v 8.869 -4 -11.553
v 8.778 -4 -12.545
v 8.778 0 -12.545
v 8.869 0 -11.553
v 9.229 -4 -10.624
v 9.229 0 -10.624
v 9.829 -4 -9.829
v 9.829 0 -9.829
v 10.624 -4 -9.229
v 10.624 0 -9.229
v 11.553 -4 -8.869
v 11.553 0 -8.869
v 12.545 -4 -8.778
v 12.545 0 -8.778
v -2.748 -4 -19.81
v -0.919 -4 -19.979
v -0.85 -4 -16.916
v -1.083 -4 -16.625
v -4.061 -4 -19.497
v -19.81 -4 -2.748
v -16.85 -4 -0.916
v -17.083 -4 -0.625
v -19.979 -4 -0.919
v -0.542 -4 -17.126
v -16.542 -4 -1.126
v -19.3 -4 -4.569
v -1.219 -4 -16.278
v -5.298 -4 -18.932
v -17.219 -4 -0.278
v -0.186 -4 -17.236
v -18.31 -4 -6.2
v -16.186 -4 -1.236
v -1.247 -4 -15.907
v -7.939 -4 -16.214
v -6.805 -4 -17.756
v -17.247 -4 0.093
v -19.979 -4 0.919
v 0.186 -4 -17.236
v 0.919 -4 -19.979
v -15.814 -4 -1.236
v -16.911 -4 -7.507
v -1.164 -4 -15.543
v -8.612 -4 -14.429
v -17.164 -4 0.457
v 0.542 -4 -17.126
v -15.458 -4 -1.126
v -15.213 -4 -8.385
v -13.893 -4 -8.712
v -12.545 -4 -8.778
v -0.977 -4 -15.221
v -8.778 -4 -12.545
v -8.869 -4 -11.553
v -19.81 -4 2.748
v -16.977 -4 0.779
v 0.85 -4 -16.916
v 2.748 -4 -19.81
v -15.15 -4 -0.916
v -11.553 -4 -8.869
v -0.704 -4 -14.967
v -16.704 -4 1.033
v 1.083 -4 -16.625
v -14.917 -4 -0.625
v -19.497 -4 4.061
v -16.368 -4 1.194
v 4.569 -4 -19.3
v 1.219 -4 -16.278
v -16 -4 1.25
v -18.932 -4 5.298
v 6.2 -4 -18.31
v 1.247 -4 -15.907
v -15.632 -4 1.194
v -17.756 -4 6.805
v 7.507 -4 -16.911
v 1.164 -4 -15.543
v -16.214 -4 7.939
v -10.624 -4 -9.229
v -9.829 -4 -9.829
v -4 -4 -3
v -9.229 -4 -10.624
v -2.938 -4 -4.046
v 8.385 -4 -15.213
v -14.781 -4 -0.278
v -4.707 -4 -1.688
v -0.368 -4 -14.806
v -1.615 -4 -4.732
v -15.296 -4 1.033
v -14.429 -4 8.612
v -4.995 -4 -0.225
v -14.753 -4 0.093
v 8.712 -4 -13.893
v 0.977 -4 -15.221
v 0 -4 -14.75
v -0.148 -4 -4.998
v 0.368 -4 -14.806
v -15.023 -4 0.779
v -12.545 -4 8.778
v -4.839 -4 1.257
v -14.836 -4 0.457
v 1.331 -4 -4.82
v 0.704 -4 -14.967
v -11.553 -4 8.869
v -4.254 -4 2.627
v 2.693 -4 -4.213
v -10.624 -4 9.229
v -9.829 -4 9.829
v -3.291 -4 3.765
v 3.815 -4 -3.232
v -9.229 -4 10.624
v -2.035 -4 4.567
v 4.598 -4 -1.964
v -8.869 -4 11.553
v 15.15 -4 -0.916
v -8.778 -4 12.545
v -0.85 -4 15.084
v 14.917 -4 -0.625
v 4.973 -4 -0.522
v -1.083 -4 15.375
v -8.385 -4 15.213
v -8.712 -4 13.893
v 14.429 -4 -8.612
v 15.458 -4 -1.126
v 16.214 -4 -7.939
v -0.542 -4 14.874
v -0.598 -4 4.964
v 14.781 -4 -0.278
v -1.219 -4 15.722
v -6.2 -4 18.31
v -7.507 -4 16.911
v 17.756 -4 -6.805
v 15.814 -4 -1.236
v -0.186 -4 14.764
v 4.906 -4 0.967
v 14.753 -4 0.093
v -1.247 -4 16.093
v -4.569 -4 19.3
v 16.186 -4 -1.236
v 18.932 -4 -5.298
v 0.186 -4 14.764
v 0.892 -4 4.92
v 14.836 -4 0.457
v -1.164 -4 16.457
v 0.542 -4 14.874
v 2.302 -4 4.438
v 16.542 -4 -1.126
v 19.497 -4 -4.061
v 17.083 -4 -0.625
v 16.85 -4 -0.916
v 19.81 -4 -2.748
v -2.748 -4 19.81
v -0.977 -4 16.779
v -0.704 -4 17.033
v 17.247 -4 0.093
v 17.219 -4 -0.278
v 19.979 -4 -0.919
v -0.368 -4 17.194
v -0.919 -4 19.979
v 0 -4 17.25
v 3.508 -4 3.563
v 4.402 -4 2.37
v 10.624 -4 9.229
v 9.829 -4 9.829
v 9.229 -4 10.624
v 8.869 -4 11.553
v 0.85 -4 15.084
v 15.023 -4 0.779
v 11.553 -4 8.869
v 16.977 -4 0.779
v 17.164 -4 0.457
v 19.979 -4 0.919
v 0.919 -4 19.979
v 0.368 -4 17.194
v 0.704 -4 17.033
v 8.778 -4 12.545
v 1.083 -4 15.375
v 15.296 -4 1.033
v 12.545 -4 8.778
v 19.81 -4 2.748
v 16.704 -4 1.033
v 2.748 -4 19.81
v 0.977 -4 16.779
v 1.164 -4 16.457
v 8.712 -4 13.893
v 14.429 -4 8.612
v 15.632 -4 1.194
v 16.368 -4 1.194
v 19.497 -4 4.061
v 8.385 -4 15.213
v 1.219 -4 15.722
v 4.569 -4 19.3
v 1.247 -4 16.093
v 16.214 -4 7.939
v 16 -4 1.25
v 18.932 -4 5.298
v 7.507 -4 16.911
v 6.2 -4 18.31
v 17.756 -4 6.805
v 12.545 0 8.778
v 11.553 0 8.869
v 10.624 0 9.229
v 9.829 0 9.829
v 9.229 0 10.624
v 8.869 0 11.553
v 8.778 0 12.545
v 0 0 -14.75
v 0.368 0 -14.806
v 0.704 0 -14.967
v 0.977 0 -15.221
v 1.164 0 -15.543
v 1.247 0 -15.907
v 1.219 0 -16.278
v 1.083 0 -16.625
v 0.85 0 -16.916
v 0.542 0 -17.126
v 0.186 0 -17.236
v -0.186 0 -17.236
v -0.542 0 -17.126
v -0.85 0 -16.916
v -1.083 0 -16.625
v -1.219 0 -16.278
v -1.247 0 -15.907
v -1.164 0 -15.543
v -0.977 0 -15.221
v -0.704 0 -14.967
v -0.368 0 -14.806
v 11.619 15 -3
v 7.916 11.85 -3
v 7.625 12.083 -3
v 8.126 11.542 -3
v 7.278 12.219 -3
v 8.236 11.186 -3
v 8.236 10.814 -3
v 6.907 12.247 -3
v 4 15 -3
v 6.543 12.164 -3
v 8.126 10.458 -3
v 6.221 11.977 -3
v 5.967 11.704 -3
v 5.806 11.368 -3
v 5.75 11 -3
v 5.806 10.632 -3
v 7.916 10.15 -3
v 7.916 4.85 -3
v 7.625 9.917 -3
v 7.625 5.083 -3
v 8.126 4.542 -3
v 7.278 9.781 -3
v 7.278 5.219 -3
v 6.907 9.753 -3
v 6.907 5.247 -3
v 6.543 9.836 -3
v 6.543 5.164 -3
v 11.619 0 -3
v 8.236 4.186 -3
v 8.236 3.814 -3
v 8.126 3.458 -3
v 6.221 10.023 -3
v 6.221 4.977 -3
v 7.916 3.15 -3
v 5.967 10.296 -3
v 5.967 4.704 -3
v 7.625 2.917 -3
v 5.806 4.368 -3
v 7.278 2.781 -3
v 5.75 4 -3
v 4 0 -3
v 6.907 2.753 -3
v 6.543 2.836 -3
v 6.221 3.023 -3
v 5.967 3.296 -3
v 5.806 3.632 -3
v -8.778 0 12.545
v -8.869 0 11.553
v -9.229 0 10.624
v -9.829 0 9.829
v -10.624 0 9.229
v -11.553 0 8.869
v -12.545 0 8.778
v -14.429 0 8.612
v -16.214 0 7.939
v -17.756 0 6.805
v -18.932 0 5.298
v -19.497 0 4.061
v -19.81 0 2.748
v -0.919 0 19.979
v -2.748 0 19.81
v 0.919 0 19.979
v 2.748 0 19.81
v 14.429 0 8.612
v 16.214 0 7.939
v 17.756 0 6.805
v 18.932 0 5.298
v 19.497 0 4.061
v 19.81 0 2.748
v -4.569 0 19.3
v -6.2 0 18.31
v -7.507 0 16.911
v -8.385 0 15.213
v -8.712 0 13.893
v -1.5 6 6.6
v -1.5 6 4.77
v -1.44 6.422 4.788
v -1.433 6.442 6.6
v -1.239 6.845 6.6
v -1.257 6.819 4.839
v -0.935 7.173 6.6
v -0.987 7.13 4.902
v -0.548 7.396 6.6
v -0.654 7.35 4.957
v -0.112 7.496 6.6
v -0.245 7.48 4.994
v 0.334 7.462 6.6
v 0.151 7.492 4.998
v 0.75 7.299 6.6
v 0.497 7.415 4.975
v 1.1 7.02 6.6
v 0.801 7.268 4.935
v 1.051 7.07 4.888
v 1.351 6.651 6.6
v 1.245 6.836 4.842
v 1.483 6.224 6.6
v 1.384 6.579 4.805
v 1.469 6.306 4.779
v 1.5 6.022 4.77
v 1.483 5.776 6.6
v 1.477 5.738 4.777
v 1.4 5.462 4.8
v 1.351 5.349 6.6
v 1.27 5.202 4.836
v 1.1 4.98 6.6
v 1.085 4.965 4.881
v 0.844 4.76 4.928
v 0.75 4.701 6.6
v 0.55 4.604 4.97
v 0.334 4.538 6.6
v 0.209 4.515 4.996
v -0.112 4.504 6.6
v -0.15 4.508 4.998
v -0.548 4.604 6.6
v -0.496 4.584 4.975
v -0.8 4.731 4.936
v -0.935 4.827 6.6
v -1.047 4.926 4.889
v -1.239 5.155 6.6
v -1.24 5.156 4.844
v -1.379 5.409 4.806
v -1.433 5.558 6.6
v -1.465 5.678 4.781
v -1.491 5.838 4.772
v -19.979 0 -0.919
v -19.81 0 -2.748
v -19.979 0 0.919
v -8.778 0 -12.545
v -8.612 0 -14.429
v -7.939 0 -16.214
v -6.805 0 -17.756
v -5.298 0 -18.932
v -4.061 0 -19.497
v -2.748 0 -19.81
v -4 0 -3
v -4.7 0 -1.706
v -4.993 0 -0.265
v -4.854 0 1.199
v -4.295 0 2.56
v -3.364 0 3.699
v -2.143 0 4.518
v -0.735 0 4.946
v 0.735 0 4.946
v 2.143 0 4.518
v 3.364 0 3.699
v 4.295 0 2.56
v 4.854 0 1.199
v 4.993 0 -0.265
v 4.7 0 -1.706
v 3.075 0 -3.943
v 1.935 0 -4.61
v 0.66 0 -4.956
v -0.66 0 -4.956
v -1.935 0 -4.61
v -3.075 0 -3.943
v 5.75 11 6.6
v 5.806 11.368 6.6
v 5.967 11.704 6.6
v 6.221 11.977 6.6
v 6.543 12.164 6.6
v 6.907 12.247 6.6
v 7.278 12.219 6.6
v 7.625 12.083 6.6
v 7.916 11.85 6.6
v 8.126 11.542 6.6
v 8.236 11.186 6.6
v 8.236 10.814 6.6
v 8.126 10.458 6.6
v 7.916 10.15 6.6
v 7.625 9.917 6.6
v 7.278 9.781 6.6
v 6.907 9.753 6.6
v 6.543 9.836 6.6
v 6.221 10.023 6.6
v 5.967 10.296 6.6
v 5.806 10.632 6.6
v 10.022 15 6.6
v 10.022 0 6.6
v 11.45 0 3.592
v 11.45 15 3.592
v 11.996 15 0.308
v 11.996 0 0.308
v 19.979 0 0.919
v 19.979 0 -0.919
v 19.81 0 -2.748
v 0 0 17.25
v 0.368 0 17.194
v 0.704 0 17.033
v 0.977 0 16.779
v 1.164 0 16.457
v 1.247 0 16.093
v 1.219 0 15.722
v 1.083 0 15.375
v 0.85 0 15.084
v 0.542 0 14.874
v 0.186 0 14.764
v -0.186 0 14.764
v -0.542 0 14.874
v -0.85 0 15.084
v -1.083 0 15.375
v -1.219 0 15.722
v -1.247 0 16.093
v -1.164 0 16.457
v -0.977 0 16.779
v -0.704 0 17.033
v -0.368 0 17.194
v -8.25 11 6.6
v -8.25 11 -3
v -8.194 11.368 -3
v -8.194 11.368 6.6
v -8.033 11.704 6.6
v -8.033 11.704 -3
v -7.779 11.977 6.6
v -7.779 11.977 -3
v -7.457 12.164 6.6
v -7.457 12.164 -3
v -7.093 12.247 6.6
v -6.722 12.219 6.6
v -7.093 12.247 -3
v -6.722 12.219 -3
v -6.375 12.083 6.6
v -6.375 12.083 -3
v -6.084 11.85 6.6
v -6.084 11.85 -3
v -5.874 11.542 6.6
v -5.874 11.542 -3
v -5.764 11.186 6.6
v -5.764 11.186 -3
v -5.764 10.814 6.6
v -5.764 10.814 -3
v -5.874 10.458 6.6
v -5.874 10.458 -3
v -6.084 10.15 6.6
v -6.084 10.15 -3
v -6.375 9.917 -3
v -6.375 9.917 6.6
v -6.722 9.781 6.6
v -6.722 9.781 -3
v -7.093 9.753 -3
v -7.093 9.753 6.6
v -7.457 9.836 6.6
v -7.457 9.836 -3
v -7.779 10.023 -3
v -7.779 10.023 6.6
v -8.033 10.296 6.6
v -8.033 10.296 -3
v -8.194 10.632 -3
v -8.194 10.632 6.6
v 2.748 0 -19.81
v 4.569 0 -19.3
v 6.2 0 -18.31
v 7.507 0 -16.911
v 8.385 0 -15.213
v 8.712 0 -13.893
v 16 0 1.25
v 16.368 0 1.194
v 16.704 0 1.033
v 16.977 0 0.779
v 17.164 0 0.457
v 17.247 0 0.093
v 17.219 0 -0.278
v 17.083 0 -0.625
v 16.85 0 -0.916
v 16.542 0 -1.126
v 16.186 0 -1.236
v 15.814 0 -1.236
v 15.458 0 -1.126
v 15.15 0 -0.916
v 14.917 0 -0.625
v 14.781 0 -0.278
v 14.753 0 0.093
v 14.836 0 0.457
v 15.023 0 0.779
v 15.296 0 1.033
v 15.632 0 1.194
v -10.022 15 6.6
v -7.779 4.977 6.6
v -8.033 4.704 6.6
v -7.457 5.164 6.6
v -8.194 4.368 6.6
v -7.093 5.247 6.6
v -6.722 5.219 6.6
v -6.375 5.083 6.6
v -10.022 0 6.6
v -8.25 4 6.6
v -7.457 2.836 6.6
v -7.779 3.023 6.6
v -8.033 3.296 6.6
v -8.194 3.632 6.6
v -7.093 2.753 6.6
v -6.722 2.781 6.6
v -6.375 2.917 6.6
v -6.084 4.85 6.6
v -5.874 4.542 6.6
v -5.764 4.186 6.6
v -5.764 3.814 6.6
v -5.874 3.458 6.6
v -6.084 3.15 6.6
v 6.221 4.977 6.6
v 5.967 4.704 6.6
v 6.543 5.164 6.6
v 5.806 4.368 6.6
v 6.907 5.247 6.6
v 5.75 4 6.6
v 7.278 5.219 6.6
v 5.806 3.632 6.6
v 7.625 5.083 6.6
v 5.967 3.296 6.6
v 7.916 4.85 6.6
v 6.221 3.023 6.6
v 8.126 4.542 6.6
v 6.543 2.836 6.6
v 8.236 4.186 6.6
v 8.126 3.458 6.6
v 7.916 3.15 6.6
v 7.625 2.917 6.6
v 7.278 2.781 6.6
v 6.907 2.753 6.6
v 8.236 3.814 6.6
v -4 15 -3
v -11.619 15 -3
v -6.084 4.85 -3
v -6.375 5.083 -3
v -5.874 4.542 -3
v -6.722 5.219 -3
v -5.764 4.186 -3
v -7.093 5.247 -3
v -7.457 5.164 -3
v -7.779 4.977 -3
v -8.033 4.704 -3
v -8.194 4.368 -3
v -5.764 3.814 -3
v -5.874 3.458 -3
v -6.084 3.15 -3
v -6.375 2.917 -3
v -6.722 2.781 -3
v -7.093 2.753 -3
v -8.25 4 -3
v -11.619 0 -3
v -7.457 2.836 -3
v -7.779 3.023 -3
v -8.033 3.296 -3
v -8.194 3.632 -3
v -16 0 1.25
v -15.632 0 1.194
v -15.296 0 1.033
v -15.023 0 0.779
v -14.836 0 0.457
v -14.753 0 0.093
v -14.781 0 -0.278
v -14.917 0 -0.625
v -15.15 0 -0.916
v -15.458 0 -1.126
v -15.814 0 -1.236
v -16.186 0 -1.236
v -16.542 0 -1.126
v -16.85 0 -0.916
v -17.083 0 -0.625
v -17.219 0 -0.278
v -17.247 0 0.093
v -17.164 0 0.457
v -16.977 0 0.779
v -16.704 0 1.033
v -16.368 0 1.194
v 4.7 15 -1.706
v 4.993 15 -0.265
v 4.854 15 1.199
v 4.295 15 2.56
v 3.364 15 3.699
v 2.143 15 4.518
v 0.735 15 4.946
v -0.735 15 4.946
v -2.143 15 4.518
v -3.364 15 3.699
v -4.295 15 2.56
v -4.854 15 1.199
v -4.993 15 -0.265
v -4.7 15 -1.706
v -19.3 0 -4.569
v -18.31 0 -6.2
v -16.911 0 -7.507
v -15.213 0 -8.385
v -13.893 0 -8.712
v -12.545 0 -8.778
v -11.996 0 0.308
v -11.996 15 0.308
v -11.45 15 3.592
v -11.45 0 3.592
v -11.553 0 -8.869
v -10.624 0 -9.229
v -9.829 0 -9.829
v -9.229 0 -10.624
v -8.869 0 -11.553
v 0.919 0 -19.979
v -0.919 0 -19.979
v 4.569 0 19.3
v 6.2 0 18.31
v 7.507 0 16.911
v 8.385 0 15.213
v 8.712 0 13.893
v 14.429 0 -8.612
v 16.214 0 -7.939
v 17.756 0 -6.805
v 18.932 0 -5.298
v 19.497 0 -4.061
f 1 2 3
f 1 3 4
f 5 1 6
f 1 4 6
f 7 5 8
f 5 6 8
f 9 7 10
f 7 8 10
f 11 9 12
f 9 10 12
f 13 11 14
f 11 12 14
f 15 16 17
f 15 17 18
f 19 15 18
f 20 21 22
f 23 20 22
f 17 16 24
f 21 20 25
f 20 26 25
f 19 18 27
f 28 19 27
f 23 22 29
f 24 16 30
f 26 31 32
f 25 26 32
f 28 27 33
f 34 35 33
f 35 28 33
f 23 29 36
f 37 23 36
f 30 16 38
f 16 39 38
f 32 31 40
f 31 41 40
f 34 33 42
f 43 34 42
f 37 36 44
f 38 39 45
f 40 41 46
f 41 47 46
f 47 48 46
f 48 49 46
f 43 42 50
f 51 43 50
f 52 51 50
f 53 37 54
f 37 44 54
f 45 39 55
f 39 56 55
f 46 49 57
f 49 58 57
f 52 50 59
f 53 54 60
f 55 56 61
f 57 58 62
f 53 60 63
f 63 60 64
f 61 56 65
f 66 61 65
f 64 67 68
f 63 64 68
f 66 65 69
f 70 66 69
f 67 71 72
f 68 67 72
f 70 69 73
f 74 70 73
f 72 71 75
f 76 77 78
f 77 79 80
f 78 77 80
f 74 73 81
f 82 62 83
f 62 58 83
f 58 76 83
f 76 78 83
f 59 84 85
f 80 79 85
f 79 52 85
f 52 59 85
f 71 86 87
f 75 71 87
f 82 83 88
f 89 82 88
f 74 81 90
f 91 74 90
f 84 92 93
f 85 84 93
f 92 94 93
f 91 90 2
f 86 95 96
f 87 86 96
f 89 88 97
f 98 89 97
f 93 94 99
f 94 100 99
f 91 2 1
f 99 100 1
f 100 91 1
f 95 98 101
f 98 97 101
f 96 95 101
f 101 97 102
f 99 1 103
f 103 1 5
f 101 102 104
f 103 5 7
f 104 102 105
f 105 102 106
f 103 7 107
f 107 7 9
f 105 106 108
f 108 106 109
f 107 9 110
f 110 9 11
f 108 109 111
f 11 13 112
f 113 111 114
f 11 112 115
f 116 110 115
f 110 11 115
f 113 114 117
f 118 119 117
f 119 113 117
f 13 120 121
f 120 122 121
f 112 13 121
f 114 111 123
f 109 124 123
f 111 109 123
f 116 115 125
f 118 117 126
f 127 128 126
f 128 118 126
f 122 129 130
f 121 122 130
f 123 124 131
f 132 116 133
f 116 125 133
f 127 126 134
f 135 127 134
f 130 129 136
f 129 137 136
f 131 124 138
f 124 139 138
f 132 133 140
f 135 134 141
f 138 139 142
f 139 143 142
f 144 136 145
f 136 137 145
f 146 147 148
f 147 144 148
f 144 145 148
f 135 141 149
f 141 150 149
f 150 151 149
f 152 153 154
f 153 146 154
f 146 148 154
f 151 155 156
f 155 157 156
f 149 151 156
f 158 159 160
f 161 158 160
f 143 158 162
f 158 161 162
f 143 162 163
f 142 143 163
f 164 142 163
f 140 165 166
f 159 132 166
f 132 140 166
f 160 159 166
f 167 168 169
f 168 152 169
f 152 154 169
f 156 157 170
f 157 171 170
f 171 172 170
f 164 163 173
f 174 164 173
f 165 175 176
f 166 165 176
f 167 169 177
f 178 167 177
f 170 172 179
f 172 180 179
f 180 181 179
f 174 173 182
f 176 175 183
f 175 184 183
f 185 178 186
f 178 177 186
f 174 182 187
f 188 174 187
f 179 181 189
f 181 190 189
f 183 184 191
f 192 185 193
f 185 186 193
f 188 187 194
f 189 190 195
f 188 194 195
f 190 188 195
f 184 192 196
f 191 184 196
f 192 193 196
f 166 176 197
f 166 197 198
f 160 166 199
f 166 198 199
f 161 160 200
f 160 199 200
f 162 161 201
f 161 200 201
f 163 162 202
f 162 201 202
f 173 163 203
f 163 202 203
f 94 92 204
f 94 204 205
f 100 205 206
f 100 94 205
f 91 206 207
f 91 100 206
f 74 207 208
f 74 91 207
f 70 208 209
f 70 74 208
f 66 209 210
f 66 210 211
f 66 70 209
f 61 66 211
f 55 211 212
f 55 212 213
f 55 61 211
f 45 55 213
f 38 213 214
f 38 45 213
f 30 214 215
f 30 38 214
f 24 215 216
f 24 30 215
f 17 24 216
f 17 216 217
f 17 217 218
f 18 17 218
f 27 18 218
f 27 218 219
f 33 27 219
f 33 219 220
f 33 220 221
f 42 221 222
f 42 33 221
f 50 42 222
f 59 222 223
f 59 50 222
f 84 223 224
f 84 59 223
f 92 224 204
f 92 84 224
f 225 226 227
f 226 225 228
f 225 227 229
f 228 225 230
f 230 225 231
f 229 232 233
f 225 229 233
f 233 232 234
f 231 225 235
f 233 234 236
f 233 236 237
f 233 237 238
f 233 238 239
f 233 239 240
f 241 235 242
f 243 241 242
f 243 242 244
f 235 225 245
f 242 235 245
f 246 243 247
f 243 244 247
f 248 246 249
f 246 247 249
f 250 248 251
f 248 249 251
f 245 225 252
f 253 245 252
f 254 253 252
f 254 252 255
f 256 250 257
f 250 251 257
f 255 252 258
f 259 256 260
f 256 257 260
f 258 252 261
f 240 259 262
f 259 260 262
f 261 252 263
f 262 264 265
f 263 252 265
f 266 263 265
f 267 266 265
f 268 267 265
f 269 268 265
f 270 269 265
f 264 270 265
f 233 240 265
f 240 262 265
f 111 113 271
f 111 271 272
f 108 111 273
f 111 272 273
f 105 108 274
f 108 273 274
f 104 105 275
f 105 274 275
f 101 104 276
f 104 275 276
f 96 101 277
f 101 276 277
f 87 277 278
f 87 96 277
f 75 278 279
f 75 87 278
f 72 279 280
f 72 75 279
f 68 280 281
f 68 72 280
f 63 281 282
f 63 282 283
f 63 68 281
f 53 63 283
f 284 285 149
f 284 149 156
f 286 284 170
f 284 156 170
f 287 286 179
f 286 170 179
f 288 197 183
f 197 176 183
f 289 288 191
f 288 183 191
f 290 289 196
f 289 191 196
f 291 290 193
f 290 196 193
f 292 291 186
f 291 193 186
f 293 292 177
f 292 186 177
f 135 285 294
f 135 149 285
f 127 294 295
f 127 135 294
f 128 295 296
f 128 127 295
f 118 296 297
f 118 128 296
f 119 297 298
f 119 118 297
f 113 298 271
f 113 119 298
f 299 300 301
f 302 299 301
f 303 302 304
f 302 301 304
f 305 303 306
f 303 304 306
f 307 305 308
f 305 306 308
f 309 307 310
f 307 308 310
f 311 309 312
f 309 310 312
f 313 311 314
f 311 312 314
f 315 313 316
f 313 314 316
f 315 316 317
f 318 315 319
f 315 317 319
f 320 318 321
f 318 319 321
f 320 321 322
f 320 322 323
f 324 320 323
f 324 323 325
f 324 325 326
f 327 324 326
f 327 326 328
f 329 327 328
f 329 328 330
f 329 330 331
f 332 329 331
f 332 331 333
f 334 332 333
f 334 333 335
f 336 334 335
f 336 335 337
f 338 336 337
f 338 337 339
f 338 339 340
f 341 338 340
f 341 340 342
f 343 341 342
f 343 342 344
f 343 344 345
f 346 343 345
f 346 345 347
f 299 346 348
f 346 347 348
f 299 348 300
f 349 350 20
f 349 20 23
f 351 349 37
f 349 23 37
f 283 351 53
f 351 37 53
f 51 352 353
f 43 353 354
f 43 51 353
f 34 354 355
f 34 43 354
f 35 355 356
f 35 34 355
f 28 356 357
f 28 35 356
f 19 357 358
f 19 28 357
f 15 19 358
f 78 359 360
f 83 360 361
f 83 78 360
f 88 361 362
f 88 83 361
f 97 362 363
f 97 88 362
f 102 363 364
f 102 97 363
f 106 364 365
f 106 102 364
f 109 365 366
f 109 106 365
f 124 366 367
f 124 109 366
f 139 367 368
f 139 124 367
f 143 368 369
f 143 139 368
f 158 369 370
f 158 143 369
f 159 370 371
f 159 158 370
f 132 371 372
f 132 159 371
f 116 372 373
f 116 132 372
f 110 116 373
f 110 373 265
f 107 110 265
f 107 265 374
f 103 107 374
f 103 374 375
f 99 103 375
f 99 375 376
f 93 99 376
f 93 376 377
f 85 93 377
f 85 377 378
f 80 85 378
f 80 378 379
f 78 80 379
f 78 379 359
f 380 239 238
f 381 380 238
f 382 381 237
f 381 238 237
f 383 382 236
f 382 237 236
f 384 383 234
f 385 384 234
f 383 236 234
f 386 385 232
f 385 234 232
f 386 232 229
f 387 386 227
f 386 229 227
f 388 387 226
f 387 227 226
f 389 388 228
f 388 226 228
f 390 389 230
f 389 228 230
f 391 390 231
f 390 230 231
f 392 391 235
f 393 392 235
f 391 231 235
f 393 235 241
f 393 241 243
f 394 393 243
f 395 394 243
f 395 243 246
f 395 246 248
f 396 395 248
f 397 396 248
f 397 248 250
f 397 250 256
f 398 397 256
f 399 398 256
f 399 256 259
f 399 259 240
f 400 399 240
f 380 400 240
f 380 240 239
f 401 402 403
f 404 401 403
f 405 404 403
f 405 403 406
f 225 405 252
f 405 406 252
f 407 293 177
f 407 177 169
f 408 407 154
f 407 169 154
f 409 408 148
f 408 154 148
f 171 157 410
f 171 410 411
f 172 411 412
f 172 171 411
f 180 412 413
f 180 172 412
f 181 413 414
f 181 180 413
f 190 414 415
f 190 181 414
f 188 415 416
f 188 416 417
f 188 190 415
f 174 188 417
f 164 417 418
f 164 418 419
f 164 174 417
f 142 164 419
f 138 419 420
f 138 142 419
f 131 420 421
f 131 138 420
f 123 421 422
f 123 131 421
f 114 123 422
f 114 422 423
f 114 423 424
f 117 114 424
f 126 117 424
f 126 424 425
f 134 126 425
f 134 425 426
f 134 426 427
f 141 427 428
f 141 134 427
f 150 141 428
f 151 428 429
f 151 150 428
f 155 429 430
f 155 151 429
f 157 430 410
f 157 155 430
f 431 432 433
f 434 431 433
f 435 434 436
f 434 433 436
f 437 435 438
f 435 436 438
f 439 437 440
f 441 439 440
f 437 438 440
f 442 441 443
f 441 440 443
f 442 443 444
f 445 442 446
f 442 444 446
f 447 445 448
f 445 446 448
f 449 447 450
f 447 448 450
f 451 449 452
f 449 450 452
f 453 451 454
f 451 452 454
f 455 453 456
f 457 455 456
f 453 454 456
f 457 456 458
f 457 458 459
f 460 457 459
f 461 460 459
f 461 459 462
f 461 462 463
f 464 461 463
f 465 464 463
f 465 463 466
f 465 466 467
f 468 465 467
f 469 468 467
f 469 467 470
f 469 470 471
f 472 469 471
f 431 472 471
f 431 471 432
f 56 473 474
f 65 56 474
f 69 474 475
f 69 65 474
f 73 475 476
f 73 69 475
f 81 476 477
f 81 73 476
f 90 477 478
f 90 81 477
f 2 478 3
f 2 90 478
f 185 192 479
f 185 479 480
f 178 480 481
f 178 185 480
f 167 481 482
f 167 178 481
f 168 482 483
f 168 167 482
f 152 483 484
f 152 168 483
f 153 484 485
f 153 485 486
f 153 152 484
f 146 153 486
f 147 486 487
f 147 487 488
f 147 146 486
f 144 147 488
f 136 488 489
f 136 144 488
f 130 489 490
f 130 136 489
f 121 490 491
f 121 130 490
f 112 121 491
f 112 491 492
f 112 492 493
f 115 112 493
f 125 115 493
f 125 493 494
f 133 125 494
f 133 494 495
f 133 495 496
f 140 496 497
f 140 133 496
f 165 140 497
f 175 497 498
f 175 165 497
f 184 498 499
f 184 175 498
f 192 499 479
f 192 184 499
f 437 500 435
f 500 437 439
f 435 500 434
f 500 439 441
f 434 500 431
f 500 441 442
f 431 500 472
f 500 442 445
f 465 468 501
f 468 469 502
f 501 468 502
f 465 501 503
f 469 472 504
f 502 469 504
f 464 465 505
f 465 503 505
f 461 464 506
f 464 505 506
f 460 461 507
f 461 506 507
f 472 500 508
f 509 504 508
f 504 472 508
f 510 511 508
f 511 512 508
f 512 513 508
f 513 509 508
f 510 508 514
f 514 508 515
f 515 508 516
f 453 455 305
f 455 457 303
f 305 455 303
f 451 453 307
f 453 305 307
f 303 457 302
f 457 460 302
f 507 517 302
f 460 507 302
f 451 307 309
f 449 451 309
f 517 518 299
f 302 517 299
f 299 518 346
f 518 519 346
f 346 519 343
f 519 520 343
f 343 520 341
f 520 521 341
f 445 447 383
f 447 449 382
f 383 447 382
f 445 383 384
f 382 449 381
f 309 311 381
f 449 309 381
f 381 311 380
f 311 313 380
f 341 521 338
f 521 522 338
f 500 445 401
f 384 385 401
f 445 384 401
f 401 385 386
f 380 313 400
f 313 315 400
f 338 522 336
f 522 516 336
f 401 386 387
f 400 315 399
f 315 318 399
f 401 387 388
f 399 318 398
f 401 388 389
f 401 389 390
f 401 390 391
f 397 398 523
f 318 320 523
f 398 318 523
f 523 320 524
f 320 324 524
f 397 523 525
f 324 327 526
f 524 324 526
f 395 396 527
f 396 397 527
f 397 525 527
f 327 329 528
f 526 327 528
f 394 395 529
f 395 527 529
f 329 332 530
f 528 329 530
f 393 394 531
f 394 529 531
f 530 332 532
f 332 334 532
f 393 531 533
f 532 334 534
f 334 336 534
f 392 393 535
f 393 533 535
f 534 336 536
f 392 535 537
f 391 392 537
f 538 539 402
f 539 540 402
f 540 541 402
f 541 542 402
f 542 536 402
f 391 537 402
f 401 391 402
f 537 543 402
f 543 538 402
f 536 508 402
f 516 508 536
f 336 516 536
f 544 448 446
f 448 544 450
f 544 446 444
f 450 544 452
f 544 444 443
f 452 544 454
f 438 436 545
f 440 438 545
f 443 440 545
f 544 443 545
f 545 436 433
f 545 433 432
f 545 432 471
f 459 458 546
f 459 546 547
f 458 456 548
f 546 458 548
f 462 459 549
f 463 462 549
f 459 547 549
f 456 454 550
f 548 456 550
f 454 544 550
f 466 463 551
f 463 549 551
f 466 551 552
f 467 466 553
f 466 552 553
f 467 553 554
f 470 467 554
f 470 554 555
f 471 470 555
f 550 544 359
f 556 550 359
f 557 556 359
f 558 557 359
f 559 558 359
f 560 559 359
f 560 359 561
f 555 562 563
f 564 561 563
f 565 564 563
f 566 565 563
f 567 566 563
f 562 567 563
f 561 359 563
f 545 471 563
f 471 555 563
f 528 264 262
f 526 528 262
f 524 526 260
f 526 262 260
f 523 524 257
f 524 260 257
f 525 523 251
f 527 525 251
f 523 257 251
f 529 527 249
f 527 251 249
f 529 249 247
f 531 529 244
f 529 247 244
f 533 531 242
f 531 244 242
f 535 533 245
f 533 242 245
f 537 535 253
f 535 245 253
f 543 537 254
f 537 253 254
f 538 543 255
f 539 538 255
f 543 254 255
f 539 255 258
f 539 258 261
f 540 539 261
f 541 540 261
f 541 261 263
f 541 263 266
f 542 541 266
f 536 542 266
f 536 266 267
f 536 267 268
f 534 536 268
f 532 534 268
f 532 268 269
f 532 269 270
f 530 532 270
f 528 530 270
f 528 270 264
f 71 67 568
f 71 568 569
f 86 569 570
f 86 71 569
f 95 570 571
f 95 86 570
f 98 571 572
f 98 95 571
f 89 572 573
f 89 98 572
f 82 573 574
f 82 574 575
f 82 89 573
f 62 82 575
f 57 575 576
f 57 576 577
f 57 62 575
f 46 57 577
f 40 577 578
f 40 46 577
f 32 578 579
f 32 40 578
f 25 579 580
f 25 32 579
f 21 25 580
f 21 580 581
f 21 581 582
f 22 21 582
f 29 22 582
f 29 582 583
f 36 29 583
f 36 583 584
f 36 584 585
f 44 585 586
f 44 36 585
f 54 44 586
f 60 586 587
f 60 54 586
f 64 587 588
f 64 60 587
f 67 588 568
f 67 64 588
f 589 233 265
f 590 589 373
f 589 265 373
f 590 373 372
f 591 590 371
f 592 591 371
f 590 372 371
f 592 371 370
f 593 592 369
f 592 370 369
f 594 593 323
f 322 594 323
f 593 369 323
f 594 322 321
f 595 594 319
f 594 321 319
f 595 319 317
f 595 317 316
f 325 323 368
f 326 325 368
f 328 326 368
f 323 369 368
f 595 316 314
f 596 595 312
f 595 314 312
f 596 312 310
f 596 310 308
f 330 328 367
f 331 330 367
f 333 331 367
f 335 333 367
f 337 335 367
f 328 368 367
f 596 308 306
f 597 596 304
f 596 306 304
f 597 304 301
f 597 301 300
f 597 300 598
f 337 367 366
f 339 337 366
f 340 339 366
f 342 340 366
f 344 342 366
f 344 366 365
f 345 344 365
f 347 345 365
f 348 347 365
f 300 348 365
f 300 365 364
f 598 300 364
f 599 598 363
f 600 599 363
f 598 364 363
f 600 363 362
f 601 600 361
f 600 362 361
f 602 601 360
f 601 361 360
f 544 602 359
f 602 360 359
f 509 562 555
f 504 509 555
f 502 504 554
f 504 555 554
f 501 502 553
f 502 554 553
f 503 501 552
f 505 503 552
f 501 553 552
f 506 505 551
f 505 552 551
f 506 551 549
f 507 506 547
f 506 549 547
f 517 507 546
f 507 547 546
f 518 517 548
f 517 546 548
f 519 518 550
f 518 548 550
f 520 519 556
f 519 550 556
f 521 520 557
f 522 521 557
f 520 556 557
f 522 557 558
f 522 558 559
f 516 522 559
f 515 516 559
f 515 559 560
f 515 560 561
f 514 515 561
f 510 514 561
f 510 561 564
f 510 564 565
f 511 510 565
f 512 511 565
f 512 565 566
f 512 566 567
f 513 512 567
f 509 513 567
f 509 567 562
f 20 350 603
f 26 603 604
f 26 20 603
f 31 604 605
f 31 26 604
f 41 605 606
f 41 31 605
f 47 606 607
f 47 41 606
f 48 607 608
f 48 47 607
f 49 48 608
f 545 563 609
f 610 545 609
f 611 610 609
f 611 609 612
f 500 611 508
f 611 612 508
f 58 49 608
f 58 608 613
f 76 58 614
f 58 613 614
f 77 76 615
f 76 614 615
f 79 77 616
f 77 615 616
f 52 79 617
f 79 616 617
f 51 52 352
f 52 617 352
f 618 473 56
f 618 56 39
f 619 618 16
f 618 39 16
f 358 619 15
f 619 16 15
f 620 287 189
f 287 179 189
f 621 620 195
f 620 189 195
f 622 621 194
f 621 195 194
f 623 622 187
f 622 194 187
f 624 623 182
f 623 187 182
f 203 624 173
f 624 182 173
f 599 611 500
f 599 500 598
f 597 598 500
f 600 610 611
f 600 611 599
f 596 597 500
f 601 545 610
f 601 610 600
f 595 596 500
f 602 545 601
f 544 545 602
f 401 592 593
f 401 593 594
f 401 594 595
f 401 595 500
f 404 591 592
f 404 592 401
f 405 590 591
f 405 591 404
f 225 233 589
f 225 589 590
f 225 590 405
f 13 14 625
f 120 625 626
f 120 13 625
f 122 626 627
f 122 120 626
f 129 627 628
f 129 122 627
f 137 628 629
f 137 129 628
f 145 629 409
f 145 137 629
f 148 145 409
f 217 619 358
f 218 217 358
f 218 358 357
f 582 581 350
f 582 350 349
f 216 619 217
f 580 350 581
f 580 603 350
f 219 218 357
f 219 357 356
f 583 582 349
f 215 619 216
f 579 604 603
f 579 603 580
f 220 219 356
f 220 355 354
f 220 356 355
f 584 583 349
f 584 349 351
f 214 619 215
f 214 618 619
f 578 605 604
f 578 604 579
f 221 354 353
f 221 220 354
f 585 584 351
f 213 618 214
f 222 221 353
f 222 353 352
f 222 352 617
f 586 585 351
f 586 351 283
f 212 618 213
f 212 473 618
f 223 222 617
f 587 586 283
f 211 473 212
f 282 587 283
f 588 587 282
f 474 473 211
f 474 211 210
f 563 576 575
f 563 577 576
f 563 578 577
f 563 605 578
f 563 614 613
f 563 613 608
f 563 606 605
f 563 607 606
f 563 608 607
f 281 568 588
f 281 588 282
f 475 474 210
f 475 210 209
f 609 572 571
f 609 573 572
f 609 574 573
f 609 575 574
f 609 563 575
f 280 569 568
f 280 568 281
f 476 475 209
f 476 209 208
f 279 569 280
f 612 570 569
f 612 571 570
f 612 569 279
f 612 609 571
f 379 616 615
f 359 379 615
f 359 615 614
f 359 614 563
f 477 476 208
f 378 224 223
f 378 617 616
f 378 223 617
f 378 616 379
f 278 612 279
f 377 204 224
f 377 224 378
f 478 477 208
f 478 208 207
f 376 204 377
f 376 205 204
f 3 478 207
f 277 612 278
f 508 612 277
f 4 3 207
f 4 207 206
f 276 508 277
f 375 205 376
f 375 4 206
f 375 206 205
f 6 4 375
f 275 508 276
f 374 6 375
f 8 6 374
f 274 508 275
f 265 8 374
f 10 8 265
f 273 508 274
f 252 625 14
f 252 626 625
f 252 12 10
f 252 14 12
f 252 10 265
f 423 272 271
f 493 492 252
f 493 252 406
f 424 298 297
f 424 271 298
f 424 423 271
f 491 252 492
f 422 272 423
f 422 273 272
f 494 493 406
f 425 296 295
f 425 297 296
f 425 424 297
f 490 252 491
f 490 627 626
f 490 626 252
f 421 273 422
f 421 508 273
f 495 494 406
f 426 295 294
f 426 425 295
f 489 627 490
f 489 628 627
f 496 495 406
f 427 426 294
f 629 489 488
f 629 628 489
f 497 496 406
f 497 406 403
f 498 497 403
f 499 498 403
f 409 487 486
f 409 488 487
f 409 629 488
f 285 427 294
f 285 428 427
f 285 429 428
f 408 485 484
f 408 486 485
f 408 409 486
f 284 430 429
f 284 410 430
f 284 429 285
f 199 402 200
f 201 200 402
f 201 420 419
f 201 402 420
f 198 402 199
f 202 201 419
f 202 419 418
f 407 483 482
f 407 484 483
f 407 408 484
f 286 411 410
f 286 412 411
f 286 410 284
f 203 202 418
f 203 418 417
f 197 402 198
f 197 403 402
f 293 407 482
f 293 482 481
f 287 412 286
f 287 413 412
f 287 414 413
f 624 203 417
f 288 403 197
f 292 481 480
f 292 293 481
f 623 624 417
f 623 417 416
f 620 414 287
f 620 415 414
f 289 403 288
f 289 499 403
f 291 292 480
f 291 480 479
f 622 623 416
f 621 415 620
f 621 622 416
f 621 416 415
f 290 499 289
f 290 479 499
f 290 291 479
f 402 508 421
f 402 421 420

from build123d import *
from build123d.topology import SkipClean

# Parameters (mm, degrees)
EXTRUDE_1_DEPTH     = 15
EXTRUDE_START       = -4
SKETCH_3_R          = 20
SKETCH_3_R_2        = 1.25
SKETCH_3_R_3        = 5
EXTRUDE_2_DEPTH     = 4
SKETCH_4_R          = 3.6
CUT_EXTRUDE_1_DEPTH = 33.015621
FILLET_1_R          = 7
SKETCH_5_R          = 1.25
SKETCH_5_R_2        = 1.5
CUT_EXTRUDE_2_DEPTH = 34.970576


with BuildPart() as part:
    # 草图2 → 凸台-拉伸1 (new body)
    with BuildSketch(Plane(origin=(0, 0, 0), x_dir=(1, 0, 0), z_dir=(0, 1, 0))):
        with BuildLine():
            Line((-10.021976, -6.6), (10.021976, -6.6))
            ThreePointArc((10.021976, -6.6), (11.837332, -1.969158), (11.61895, 3))
            Line((11.61895, 3), (4, 3))
            ThreePointArc((4, 3), (0, -5), (-4, 3))
            Line((-4, 3), (-11.61895, 3))
            ThreePointArc((-11.61895, 3), (-11.837332, -1.969158), (-10.021976, -6.6))
        make_face()
    extrude(amount=EXTRUDE_1_DEPTH)

    # 草图3 → 凸台-拉伸2 (add)
    with SkipClean():  # the faces are left unmerged after this step: merging them gives an invalid solid
        with BuildSketch(Plane(origin=(0, 0, 0), x_dir=(1, 0, 0), z_dir=(0, 1, 0)).offset(EXTRUDE_START)):
            with Locations(Location((0, 0, 0), (0, 0, 270))):
                Circle(SKETCH_3_R)
            with Locations(Location((0, -16, 0), (0, 0, 270))):
                Circle(SKETCH_3_R_2, mode=Mode.SUBTRACT)
            with Locations(Location((16, 0, 0), (0, 0, 270))):
                Circle(SKETCH_3_R_2, mode=Mode.SUBTRACT)
            with Locations(Location((-16, 0, 0), (0, 0, 270))):
                Circle(SKETCH_3_R_2, mode=Mode.SUBTRACT)
            with Locations(Location((0, 16, 0), (0, 0, 270))):
                Circle(SKETCH_3_R_2, mode=Mode.SUBTRACT)
            with Locations(Location((0, 0, 0), (0, 0, 143.130102))):
                Circle(SKETCH_3_R_3, mode=Mode.SUBTRACT)
        extrude(amount=EXTRUDE_2_DEPTH)

    # 草图4 → 切除-拉伸1 (cut, through all)
    with SkipClean():  # the faces are left unmerged after this step: merging them gives an invalid solid
        with BuildSketch(Plane(origin=(0, 0, 0), x_dir=(1, 0, 0), z_dir=(0, 1, 0))):
            with Locations((12.374369, -12.374369)):
                Circle(SKETCH_4_R)
            with Locations((12.374369, 12.374369)):
                Circle(SKETCH_4_R)
            with Locations((-12.374369, 12.374369)):
                Circle(SKETCH_4_R)
            with Locations((-12.374369, -12.374369)):
                Circle(SKETCH_4_R)
        extrude(amount=-CUT_EXTRUDE_1_DEPTH, mode=Mode.SUBTRACT)

    # 圆角1
    fillet_1_edges = [part.edges().sort_by_distance(p)[0] for p in [
        (-12.053138, -2, 15.960008),
        (-15.960008, -2, 12.053138),
        (-15.960008, -2, -12.053138),
        (-12.053138, -2, -15.960008),
        (12.053138, -2, -15.960008),
        (15.960008, -2, -12.053138),
        (15.960008, -2, 12.053138),
        (12.053138, -2, 15.960008),
    ]]
    fillet(fillet_1_edges, radius=FILLET_1_R)

    # 草图5 → 切除-拉伸2 (cut, through all)
    with SkipClean():  # the faces are left unmerged after this step: merging them gives an invalid solid
        with BuildSketch(Plane(origin=(0, 0, -3), x_dir=(-1, 0, 0), z_dir=(0, 0, -1))):
            with Locations((-7, 11)):
                Circle(SKETCH_5_R)
            with Locations((-7, 4)):
                Circle(SKETCH_5_R)
            with Locations((7, 11)):
                Circle(SKETCH_5_R)
            with Locations((7, 4)):
                Circle(SKETCH_5_R)
            with Locations((0, 6)):
                Circle(SKETCH_5_R_2)
        extrude(amount=-CUT_EXTRUDE_2_DEPTH, mode=Mode.SUBTRACT)


solid = part.part
